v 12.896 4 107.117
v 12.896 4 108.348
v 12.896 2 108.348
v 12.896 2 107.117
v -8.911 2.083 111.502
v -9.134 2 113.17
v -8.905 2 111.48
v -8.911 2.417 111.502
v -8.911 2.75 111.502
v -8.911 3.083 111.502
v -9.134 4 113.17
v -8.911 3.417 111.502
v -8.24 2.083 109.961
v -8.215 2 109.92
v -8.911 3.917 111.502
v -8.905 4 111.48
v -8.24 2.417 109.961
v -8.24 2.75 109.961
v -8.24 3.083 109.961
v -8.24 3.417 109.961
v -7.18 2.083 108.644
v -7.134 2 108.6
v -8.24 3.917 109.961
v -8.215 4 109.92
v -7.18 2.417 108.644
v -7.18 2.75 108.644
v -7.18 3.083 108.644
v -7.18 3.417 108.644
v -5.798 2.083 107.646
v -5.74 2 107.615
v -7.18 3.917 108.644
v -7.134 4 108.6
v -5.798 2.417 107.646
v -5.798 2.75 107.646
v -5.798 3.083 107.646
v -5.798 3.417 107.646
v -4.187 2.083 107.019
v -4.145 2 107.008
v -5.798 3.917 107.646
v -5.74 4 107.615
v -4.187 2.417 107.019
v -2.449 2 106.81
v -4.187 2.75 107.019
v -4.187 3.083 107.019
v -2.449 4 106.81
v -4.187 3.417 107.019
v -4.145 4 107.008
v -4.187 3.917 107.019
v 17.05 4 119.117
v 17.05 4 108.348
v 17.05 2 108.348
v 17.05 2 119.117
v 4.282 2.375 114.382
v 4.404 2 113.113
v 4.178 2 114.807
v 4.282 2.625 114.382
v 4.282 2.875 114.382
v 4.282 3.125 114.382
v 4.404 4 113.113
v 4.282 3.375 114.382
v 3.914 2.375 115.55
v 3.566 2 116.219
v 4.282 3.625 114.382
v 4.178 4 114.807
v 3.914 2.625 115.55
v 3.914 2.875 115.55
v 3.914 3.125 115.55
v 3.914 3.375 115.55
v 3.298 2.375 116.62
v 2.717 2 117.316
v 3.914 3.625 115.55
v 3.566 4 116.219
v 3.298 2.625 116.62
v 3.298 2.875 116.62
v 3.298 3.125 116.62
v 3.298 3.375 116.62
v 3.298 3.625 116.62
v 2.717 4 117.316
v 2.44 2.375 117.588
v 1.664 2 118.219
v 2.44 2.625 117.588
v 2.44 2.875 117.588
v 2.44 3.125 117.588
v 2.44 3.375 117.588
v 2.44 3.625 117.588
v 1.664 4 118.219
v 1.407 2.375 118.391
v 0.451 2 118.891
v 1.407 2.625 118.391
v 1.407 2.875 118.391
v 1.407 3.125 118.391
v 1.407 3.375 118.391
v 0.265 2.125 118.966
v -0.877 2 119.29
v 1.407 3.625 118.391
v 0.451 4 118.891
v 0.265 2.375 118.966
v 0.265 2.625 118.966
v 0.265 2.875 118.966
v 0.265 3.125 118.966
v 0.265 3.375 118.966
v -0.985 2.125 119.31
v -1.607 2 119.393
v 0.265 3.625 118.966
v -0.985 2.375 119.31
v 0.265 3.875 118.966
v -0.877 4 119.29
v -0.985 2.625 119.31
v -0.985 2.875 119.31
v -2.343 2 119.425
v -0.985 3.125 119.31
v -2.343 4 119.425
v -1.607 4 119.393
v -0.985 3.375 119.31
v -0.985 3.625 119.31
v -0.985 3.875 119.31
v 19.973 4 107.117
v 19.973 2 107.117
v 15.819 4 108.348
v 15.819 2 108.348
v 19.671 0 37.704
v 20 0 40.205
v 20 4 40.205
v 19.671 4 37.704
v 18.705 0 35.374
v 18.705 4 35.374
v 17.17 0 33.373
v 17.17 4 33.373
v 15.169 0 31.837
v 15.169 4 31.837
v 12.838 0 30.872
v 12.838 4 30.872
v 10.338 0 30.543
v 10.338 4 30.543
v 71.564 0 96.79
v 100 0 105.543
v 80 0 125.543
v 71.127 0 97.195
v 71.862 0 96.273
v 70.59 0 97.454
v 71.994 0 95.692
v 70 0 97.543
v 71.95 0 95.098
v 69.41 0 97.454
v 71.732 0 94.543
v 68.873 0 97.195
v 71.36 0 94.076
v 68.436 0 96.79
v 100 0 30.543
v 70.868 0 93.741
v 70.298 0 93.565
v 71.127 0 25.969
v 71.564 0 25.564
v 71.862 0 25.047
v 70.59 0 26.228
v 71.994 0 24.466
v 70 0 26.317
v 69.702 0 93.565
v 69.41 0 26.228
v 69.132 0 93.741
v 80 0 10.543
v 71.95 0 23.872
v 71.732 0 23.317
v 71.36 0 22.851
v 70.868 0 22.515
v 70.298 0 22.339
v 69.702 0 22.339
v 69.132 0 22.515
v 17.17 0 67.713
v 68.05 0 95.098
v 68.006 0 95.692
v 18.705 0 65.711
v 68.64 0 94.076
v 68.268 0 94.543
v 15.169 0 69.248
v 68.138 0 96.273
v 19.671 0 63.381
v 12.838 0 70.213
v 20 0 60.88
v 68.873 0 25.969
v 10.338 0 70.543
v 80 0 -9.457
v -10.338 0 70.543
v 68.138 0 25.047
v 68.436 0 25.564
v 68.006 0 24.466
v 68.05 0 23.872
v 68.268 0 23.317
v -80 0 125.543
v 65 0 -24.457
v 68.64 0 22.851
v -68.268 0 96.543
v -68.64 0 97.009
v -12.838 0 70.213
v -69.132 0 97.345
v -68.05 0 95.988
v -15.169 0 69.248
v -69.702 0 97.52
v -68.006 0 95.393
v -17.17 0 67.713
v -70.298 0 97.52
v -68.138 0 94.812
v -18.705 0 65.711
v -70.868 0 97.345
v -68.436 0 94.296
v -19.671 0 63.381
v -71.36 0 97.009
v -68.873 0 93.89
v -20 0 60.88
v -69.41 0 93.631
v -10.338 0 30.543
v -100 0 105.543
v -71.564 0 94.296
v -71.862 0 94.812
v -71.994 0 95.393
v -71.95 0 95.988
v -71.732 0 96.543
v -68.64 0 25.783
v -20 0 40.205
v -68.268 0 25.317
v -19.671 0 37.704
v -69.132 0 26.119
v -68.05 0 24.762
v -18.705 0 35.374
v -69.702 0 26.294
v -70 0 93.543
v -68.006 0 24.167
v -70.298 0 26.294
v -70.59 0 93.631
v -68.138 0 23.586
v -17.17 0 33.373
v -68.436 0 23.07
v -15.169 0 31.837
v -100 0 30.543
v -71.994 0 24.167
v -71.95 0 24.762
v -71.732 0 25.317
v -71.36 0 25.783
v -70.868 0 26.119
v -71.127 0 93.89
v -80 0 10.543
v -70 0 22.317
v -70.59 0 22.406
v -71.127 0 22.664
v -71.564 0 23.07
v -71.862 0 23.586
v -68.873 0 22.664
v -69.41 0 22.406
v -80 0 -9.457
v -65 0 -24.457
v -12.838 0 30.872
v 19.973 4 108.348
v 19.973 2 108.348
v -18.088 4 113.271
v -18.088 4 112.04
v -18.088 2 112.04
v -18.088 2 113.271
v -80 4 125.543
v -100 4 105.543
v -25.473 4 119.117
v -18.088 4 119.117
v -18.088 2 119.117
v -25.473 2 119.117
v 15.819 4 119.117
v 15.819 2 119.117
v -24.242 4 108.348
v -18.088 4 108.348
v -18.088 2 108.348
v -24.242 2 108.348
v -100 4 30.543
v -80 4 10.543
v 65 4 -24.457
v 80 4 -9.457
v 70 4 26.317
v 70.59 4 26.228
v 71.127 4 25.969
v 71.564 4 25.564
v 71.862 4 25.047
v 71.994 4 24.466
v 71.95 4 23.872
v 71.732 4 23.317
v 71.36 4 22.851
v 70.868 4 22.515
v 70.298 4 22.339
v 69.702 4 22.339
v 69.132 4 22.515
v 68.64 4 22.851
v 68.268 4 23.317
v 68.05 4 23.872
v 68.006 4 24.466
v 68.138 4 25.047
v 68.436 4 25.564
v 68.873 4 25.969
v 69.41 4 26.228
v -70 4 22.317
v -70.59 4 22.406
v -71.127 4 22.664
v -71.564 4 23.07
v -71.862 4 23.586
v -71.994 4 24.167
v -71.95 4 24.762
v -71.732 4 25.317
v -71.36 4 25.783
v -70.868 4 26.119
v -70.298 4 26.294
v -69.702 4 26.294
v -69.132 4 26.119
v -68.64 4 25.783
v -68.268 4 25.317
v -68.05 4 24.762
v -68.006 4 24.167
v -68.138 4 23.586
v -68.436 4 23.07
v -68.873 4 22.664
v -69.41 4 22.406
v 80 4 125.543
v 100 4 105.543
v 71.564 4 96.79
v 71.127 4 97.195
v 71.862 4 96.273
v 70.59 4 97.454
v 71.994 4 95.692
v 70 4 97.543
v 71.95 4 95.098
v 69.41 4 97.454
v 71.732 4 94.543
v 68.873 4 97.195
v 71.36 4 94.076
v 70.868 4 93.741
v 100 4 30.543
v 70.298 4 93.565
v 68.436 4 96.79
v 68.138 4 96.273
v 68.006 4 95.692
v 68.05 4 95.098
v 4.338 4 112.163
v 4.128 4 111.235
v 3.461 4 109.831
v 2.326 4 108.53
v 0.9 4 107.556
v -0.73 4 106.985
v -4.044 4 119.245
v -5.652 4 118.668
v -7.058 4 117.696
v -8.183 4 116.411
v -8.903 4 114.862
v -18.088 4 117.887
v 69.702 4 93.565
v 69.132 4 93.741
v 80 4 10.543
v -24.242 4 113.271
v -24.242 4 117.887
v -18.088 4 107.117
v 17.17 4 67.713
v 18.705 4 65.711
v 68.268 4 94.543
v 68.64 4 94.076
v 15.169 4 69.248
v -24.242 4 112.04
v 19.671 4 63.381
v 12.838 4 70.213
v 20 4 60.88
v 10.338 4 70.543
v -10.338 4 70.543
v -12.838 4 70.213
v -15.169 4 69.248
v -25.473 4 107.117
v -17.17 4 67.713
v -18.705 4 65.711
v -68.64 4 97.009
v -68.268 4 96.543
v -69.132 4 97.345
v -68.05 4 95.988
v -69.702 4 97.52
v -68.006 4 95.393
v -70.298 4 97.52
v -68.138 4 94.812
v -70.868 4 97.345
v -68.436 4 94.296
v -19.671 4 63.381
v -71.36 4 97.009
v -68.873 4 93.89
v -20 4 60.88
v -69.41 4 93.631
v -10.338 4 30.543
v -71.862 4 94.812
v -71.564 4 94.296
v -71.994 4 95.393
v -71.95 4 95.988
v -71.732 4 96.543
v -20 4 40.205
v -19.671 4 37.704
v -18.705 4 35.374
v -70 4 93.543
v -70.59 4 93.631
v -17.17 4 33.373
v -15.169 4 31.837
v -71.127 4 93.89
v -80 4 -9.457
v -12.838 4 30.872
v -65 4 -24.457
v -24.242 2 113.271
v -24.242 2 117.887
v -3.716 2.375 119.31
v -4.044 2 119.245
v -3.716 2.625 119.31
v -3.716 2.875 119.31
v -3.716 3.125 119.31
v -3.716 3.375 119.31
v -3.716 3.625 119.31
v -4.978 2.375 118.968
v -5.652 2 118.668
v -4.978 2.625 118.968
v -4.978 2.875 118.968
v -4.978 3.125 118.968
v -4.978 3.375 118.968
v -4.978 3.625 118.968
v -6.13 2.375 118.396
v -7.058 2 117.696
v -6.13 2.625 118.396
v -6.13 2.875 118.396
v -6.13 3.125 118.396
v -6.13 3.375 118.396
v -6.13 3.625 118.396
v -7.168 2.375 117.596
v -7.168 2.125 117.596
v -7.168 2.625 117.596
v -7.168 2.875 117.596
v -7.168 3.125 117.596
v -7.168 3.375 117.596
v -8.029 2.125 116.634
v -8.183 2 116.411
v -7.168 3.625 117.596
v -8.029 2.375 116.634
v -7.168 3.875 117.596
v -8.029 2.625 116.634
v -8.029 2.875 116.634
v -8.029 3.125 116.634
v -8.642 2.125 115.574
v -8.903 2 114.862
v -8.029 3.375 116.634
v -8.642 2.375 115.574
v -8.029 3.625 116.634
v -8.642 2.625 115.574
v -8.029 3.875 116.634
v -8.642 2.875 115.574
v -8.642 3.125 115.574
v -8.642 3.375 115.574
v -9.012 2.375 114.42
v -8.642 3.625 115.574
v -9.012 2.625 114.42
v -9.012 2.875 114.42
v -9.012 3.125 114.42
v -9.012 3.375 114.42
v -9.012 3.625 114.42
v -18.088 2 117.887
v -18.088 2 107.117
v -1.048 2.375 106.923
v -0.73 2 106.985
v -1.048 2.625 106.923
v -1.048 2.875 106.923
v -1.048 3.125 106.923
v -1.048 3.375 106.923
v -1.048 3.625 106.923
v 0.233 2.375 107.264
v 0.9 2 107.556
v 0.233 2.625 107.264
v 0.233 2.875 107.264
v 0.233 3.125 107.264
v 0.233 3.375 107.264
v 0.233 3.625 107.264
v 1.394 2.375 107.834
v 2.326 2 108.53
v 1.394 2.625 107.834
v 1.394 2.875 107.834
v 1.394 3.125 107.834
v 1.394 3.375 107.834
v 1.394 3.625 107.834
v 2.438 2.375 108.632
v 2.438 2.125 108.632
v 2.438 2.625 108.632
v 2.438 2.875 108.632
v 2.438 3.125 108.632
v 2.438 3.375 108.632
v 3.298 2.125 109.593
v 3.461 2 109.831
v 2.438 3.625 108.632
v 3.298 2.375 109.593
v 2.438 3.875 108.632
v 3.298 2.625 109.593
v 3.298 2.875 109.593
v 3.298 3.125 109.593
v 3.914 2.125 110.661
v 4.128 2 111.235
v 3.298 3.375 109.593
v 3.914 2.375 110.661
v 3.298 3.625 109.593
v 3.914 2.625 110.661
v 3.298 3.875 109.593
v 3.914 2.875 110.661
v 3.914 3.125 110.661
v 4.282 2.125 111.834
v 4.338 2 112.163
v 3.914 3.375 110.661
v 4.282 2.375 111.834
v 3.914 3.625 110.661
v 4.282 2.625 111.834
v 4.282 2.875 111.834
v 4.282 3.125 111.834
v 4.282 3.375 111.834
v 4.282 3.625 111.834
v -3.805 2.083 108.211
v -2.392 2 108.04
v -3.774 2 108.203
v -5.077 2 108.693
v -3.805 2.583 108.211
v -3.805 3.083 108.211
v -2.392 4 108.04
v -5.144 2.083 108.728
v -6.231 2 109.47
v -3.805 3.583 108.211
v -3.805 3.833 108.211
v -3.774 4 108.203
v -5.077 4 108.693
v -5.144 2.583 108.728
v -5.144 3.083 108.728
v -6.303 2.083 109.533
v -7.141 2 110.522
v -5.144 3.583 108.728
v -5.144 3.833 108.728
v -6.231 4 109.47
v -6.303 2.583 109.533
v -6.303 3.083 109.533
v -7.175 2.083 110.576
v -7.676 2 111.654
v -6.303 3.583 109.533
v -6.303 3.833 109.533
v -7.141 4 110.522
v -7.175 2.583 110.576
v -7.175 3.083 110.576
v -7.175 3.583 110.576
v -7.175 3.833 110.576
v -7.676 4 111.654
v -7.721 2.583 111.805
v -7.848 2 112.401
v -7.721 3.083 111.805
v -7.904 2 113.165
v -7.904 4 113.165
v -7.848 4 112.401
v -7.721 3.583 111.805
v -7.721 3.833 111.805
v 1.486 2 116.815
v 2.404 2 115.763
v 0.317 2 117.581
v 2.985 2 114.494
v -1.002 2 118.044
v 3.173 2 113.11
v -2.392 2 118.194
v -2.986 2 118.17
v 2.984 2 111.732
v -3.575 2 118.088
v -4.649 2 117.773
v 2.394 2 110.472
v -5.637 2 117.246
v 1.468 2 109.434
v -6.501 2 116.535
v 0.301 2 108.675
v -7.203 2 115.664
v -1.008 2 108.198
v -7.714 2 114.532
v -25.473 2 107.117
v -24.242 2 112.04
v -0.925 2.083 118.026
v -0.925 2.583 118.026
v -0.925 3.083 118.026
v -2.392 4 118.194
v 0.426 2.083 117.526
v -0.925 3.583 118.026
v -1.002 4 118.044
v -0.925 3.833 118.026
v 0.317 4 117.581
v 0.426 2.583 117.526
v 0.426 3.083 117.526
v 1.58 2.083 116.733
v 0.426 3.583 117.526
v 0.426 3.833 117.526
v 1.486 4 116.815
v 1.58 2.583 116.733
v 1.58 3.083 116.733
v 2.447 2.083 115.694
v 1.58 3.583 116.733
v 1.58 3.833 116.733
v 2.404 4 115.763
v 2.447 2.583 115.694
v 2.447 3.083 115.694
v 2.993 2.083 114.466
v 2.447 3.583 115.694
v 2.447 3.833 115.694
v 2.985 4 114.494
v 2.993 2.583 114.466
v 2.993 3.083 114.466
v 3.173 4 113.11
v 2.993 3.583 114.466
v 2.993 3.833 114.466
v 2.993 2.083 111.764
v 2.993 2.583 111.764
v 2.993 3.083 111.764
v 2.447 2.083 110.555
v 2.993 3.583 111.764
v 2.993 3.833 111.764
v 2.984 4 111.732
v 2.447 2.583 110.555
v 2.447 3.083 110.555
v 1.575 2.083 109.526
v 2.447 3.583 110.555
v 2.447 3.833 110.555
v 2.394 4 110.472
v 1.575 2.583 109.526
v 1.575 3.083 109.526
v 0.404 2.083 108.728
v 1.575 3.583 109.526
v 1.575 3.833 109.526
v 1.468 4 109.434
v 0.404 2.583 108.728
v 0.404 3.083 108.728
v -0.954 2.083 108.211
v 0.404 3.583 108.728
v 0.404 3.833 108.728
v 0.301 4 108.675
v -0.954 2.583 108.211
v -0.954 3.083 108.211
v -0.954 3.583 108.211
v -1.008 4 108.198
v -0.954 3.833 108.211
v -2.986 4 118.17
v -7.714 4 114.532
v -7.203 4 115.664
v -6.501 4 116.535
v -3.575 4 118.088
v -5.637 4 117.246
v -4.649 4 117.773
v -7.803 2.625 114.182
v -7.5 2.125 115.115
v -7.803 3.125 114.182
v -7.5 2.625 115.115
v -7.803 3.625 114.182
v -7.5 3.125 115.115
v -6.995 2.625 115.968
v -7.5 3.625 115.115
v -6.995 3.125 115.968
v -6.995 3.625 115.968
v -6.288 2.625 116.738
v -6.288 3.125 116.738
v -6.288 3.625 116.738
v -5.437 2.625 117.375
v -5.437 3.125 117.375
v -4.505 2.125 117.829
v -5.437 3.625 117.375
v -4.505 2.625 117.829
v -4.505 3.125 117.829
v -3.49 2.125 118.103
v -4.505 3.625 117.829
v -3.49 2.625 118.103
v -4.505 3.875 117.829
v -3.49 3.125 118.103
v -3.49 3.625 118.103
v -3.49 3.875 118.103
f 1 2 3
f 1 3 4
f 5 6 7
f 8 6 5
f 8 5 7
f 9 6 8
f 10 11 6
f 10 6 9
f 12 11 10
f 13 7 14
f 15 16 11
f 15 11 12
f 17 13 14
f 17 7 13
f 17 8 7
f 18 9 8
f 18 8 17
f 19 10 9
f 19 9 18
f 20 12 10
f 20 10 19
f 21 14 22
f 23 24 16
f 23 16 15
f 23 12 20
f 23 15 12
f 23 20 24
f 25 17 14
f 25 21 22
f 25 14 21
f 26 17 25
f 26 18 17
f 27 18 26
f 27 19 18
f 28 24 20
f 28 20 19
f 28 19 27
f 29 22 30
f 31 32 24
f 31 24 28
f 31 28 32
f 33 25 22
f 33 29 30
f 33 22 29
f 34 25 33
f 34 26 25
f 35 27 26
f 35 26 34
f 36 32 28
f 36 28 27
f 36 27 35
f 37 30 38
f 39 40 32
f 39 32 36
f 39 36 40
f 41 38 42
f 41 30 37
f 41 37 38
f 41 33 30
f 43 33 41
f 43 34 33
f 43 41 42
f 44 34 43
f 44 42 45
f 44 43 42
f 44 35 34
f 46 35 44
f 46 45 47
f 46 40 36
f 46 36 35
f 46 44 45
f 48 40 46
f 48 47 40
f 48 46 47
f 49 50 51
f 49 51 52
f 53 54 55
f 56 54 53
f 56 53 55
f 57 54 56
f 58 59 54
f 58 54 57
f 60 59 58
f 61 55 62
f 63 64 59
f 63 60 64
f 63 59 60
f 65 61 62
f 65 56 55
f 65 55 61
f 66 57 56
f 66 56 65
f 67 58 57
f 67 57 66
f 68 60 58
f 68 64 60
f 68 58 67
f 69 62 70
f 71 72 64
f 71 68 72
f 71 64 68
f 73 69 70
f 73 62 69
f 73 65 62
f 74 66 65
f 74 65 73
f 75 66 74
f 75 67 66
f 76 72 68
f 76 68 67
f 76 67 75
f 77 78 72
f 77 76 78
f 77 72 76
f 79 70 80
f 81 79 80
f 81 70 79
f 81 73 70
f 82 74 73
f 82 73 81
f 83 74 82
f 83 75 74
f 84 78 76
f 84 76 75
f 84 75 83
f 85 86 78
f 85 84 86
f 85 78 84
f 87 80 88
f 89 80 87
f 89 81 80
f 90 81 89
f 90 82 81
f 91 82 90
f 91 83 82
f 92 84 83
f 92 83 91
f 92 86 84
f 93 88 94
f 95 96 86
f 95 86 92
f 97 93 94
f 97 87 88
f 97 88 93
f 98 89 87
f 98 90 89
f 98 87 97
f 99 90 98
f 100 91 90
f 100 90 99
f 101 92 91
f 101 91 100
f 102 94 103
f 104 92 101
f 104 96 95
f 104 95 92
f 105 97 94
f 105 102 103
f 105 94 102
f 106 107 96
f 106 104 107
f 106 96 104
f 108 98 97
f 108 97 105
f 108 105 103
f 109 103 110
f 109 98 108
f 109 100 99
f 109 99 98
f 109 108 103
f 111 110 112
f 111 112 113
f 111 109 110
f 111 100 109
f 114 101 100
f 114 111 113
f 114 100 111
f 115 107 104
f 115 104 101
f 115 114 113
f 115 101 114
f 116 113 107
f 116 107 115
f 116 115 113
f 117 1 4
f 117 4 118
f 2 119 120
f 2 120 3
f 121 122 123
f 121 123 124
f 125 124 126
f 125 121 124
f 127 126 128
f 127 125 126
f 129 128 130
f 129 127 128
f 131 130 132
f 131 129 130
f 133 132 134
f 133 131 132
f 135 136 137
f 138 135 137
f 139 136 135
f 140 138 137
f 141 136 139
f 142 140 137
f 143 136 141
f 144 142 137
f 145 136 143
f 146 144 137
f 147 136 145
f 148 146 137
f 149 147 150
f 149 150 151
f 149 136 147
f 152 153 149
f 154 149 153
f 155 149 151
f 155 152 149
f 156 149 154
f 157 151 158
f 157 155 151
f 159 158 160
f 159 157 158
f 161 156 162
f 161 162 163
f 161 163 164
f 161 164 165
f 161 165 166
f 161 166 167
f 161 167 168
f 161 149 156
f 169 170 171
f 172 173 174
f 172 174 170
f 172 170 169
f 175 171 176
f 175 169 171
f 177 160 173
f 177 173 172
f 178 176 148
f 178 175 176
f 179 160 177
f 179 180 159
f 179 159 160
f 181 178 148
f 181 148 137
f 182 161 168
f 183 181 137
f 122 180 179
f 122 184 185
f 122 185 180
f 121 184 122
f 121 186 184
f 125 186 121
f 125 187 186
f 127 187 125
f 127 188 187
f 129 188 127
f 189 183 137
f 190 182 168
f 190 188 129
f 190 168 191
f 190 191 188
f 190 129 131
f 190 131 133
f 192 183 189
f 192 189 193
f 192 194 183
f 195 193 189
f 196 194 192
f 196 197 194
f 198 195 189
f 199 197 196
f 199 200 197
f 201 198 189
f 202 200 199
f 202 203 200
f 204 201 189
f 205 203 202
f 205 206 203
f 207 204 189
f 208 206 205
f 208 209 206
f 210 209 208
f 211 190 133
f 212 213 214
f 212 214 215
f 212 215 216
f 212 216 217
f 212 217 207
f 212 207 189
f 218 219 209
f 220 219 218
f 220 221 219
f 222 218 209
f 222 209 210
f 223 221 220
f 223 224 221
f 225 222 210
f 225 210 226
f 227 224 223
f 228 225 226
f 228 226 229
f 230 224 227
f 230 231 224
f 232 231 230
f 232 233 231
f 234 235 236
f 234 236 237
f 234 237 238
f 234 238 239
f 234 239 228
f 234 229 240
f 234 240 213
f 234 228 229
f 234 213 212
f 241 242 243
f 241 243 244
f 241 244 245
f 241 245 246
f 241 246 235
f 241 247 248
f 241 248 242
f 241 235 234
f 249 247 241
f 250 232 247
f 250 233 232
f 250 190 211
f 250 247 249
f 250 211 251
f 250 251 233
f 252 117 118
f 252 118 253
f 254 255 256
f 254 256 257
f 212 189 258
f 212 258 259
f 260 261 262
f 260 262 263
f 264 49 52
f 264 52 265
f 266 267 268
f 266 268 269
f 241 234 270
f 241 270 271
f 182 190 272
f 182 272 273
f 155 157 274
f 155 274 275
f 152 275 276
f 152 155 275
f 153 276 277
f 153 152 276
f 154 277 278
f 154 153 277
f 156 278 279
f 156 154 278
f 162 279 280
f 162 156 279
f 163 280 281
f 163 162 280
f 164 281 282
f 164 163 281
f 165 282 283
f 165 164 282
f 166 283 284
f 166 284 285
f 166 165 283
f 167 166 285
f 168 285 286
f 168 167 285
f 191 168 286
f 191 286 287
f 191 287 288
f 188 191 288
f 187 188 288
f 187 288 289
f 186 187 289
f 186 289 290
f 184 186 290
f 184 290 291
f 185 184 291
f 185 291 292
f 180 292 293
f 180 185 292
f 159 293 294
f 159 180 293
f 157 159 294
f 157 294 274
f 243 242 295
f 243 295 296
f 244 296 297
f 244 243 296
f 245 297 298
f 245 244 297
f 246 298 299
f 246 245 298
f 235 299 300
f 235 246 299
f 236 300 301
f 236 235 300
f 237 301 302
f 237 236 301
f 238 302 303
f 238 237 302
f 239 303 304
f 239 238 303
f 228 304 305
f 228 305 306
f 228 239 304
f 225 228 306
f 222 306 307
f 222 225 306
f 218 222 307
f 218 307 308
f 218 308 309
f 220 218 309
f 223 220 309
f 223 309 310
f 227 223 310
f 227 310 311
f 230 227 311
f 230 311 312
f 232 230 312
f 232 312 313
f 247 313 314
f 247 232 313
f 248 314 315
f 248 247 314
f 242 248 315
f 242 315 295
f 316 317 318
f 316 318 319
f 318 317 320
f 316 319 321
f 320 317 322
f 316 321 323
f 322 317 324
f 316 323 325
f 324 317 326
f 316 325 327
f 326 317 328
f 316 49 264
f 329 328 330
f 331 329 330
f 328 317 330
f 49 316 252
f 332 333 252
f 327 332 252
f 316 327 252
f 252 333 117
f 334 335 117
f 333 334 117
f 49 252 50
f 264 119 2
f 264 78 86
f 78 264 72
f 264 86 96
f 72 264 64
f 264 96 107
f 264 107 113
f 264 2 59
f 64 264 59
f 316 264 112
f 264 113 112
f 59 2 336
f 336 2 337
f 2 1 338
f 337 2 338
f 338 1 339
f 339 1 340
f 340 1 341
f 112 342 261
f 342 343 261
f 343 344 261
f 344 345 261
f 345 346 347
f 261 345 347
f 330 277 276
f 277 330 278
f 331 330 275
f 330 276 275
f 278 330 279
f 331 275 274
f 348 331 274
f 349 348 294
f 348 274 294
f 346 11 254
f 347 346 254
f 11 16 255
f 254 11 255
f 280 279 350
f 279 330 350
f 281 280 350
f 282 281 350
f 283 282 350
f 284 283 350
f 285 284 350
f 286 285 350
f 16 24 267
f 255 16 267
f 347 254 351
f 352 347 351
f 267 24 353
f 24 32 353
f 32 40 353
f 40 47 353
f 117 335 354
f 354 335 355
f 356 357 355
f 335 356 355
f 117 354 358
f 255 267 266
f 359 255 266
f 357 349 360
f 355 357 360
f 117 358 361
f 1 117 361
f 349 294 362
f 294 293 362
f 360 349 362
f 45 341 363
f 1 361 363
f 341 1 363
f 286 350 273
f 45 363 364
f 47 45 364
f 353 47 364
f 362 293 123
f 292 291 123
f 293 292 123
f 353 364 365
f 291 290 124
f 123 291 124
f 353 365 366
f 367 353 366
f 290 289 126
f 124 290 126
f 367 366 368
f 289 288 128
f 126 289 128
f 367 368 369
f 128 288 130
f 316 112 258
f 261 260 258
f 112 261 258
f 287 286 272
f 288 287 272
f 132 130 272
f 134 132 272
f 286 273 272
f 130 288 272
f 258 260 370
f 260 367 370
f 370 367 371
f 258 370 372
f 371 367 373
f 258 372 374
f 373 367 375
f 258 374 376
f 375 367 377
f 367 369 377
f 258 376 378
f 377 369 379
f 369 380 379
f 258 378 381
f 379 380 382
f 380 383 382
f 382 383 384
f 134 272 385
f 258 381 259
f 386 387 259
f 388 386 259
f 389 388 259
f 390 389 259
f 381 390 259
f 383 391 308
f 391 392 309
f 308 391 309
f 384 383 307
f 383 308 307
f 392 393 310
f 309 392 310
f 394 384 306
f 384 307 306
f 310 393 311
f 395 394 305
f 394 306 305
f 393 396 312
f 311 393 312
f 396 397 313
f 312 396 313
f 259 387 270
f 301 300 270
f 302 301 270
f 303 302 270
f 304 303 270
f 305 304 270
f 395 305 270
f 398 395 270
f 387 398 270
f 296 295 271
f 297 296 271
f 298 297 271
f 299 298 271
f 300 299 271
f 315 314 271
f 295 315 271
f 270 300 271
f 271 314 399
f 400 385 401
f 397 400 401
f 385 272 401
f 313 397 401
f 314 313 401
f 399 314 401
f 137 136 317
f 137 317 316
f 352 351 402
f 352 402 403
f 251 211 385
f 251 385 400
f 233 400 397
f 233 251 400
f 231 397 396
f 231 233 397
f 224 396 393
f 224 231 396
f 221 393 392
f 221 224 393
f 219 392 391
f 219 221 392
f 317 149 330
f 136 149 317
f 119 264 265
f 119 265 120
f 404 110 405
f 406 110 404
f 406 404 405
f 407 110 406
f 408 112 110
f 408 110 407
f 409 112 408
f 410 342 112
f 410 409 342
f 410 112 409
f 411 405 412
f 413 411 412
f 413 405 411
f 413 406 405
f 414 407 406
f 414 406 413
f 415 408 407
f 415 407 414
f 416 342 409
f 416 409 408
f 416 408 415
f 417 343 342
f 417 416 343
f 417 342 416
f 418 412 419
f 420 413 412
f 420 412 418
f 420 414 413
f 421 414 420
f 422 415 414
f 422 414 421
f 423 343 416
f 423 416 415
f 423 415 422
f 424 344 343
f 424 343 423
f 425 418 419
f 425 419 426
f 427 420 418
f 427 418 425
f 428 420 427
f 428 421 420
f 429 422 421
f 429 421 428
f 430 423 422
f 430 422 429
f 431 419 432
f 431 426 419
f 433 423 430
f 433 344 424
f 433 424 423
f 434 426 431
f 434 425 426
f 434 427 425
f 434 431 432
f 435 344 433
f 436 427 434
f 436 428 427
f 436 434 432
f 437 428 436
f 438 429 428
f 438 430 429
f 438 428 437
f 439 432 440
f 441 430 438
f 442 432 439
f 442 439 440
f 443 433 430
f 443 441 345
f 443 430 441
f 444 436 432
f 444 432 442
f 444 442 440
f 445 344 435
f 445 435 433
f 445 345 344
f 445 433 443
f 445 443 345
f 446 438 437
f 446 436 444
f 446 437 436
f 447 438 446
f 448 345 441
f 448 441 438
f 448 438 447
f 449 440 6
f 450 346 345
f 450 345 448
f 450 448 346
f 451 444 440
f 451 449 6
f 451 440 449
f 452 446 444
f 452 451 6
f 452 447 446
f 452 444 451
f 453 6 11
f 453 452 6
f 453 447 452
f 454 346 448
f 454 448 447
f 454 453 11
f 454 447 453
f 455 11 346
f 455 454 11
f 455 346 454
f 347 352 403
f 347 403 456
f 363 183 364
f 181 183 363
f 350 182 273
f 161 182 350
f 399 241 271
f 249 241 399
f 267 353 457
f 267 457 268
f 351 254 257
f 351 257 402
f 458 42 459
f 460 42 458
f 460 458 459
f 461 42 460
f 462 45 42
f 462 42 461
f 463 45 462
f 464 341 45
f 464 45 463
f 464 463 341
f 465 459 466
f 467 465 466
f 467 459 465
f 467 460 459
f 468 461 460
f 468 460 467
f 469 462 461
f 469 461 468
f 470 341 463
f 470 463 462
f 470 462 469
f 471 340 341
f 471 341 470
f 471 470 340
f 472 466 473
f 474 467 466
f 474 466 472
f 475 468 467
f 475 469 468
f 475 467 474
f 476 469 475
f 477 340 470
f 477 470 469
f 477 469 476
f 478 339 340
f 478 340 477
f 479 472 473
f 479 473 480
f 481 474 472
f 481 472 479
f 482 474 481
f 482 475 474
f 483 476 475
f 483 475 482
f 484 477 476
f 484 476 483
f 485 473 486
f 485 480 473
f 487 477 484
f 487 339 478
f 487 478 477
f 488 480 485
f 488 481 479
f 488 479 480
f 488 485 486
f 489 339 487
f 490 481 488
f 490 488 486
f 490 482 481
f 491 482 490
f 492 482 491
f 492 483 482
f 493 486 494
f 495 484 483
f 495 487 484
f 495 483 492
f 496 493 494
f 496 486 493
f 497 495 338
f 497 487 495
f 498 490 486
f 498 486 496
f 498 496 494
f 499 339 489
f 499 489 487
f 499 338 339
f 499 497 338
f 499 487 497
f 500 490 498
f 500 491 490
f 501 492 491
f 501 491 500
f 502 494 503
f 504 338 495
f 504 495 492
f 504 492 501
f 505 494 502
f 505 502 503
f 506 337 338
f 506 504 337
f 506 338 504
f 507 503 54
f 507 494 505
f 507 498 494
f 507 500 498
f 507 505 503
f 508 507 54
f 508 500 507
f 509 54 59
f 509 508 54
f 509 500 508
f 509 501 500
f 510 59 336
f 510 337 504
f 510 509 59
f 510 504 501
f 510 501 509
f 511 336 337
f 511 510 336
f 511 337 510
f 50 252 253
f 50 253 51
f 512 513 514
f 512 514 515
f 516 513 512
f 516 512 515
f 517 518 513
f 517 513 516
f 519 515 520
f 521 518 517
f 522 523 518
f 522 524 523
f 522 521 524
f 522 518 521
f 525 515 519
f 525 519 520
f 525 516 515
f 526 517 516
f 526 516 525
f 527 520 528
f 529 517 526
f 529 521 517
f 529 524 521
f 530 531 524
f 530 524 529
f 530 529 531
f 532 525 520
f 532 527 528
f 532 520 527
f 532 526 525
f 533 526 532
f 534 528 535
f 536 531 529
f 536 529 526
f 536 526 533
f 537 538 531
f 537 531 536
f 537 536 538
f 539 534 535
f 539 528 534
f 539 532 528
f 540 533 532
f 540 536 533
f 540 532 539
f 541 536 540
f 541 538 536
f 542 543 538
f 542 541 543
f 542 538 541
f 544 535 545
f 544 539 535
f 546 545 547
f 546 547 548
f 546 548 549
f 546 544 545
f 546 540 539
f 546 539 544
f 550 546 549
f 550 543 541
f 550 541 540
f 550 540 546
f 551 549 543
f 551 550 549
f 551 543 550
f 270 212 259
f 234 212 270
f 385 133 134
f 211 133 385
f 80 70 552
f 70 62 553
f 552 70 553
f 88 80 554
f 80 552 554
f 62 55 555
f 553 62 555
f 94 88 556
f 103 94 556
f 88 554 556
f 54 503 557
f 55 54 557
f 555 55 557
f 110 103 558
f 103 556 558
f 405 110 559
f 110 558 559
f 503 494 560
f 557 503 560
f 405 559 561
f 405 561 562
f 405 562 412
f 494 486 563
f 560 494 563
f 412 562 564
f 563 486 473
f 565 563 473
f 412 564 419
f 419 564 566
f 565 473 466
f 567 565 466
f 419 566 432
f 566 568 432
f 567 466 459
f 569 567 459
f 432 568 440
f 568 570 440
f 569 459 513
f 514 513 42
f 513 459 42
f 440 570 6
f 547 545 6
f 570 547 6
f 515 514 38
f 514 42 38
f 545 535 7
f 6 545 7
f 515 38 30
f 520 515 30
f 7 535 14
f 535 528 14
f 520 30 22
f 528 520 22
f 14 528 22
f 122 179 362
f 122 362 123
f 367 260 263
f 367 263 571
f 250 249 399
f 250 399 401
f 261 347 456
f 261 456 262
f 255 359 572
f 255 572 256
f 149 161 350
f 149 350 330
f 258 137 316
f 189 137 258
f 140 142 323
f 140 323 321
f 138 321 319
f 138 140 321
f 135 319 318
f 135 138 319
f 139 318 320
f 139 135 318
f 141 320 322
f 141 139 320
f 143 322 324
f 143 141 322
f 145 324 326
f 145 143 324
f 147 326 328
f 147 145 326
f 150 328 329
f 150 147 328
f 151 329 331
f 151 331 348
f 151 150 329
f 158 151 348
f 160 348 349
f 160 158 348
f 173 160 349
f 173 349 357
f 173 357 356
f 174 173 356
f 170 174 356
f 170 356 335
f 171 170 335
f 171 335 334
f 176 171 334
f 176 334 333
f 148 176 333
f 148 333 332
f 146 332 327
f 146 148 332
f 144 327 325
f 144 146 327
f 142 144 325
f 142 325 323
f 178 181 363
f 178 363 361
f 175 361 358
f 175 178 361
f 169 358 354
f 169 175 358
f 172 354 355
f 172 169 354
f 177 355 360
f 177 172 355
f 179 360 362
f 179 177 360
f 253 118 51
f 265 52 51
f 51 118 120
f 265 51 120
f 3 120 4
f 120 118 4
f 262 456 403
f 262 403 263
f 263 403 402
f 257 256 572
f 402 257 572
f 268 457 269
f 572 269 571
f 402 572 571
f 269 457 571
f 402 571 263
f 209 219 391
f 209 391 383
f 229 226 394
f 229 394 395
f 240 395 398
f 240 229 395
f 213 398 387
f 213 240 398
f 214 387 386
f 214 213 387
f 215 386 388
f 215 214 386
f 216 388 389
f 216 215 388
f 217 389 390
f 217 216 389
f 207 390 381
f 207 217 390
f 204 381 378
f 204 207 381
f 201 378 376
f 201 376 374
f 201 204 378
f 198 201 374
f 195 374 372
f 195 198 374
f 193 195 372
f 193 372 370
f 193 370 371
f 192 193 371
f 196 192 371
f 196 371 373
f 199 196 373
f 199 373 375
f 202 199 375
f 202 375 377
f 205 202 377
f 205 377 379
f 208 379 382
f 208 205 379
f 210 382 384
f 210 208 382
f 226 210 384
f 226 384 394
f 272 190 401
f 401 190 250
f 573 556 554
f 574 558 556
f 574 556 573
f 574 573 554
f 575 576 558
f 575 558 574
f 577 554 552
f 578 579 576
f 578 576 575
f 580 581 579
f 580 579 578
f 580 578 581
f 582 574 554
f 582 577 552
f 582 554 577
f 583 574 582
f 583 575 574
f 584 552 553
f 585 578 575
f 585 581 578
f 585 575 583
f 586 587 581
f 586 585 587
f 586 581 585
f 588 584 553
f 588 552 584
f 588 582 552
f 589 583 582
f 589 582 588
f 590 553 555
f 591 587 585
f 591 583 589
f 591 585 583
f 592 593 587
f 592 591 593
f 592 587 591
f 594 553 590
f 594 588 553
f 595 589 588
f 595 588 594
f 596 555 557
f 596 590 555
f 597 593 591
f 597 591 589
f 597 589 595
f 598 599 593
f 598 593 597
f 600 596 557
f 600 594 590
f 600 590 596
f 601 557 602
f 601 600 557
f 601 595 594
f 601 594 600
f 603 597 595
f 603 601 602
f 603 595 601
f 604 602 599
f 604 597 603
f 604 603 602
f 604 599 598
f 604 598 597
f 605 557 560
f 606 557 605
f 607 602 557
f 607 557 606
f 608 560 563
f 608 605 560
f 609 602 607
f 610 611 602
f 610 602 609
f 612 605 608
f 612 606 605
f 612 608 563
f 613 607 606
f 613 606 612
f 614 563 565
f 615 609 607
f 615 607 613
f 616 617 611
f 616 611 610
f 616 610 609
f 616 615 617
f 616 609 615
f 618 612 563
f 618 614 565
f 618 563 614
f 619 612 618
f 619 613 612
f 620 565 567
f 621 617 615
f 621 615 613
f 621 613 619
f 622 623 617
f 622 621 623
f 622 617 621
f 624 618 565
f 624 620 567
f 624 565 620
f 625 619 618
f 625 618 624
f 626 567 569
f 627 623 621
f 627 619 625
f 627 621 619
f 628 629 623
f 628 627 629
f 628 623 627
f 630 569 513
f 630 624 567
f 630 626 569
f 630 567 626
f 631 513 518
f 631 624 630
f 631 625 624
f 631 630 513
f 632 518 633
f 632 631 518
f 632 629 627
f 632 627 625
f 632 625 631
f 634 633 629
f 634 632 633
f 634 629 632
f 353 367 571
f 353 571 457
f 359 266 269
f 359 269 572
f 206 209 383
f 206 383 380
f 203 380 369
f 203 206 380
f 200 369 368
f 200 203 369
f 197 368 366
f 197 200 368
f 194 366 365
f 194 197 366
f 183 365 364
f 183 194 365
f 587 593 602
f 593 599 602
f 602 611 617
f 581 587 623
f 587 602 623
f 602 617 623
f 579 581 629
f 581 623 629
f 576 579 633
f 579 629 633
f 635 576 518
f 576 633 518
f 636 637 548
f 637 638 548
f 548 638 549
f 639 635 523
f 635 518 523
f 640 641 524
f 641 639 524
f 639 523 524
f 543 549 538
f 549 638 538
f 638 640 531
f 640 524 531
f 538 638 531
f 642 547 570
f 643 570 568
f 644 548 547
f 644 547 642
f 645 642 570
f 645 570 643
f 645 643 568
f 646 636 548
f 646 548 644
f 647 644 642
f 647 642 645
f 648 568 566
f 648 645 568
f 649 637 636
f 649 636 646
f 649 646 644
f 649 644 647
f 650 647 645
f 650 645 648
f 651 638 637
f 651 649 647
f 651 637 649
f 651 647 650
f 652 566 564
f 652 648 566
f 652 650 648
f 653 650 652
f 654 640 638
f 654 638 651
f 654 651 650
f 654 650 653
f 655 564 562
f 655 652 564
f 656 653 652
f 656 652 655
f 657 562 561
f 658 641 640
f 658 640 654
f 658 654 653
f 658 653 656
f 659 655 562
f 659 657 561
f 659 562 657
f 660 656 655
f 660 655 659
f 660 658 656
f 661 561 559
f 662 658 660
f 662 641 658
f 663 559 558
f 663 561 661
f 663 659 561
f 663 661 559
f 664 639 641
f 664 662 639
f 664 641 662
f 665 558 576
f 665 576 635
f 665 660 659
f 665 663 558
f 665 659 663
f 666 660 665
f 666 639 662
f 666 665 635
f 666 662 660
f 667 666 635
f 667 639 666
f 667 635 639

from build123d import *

# Parameters (mm, degrees)
SKETCH1_R           = 2
BOSS_EXTRUDE1_DEPTH = 4
CUT_EXTRUDE1_DEPTH  = 2


with BuildPart() as part:
    # Sketch1 → Boss-Extrude1 (new body)
    with BuildSketch(Plane(origin=(0, 0, 0), x_dir=(1, 0, 0), z_dir=(0, 1, 0))):
        Polygon((-80, 9.45742592), (-65, 24.45742592), (-25, 24.45742592), (25, 24.45742592), (65, 24.45742592), (80, 9.45742592), (80, -10.54257408), (100, -30.54257408), (100, -105.54257408), (80, -125.54257408), (-80, -125.54257408), (-100, -105.54257408), (-100, -30.54257408), (-80, -10.54257408), align=None)
        with Locations(Location((70, -24.316787178, 0), (0, 0, 270))):
            Circle(SKETCH1_R, mode=Mode.SUBTRACT)
        with Locations(Location((-70, -24.316787178, 0), (0, 0, 90))):
            Circle(SKETCH1_R, mode=Mode.SUBTRACT)
        with Locations(Location((70, -95.54257408, 0), (0, 0, 270))):
            Circle(SKETCH1_R, mode=Mode.SUBTRACT)
        with Locations(Location((-70, -95.54257408, 0), (0, 0, 90))):
            Circle(SKETCH1_R, mode=Mode.SUBTRACT)
        with BuildLine():
            Line((10.337598094, -30.54257408), (-10.337598094, -30.54257408))
            ThreePointArc((-10.337598094, -30.54257408), (-17.169948004, -33.372626076), (-20, -40.204975986))
            Line((-20, -40.204975986), (-20, -60.880172175))
            ThreePointArc((-20, -60.880172175), (-17.169948004, -67.712522085), (-10.337598094, -70.54257408))
            Line((-10.337598094, -70.54257408), (10.337598094, -70.54257408))
            ThreePointArc((10.337598094, -70.54257408), (17.169948004, -67.712522085), (20, -60.880172175))
            Line((20, -60.880172175), (20, -40.204975986))
            ThreePointArc((20, -40.204975986), (17.169948004, -33.372626076), (10.337598094, -30.54257408))
        make_face(mode=Mode.SUBTRACT)
    extrude(amount=BOSS_EXTRUDE1_DEPTH)

    # Sketch2 → Cut-Extrude1 (cut)
    # profile 1 of 3: a face of its own
    with BuildSketch(Plane(origin=(0, 4, 0), x_dir=(1, 0, 0), z_dir=(0, 1, 0))):
        Polygon((-25.472812288, -107.11733973), (-18.088196904, -107.11733973), (-18.088196904, -108.348108961), (-24.242043057, -108.348108961), (-24.242043057, -112.040416653), (-18.088196904, -112.040416653), (-18.088196904, -113.271185884), (-24.242043057, -113.271185884), (-24.242043057, -117.886570499), (-18.088196904, -117.886570499), (-18.088196904, -119.11733973), (-25.472812288, -119.11733973), align=None)
    # profile 2 of 3: a face of its own
    with BuildSketch(Plane(origin=(0, 4, 0), x_dir=(1, 0, 0), z_dir=(0, 1, 0))):
        with BuildLine():
            add(Edge.make_bspline(
                [(-2.449254596, -106.809647422), (-2.210250294, -106.815291388), (-1.741137338, -106.826369254), (-1.052600103, -106.910458186), (-0.39562656, -107.057401058), (0.234998612, -107.251617707), (0.833013231, -107.511533008), (1.401913508, -107.825392722), (1.940223039, -108.19794914), (2.443138546, -108.623167189), (2.901482907, -109.087804066), (3.30556983, -109.582626329), (3.641608313, -110.107938076), (3.925601094, -110.655428552), (4.137939972, -111.233761906), (4.293457565, -111.836588501), (4.386018721, -112.46623686), (4.398023561, -112.895080616), (4.404110789, -113.112532038)],
                knots=[0, 0, 0, 0, 1.104339174, 2.167575275, 3.19895946, 4.211974237, 5.212103104, 6.206540156, 7.210035823, 8.232212855, 9.245525355, 10.222267028, 11.178495095, 12.122427609, 13.066774007, 14.018748382, 14.995377748, 16, 16, 16, 16], degree=3))
            add(Edge.make_bspline(
                [(4.404110789, -113.112532038), (4.398050369, -113.328392066), (4.386099229, -113.754067761), (4.293053577, -114.379582401), (4.138376677, -114.979542971), (3.923642546, -115.555449046), (3.645900791, -116.106283535), (3.303525105, -116.630032235), (2.902767408, -117.129340391), (2.445660949, -117.597050461), (1.945808283, -118.023324325), (1.413543804, -118.399049089), (0.854948848, -118.718415341), (0.266006362, -118.975934066), (-0.347638297, -119.179500527), (-0.989897569, -119.319540684), (-1.657446562, -119.409328528), (-2.112422229, -119.419742975), (-2.343485365, -119.425032038)],
                knots=[0, 0, 0, 0, 1.006897034, 1.98559964, 2.943186421, 3.893189035, 4.847917768, 5.815452073, 6.80748931, 7.830684368, 8.862341799, 9.868509738, 10.866468422, 11.859160648, 12.862936224, 13.87796334, 14.922306222, 16, 16, 16, 16], degree=3))
            add(Edge.make_bspline(
                [(-2.343485365, -119.425032038), (-2.576950096, -119.419751502), (-3.036711209, -119.409352567), (-3.71220671, -119.319311427), (-4.360699664, -119.179942779), (-4.980525124, -118.978602698), (-5.5723218, -118.720276019), (-6.137109172, -118.40432461), (-6.672334655, -118.029426015), (-7.173565891, -117.603625551), (-7.631923667, -117.139805588), (-8.034841868, -116.645043071), (-8.372094355, -116.1233088), (-8.651102104, -115.57930445), (-8.869213941, -115.011416487), (-9.022819268, -114.418815701), (-9.116441893, -113.80221707), (-9.128324324, -113.382893249), (-9.13435075, -113.170224345)],
                knots=[0, 0, 0, 0, 1.090007837, 2.146547848, 3.177224824, 4.18441606, 5.184972819, 6.188625542, 7.201944888, 8.232227685, 9.256408654, 10.243626549, 11.2069681, 12.152656664, 13.094449289, 14.042142631, 15.007031417, 16, 16, 16, 16], degree=3))
            add(Edge.make_bspline(
                [(-9.13435075, -113.170224345), (-9.131402402, -113.027503498), (-9.125543406, -112.743886726), (-9.083913012, -112.322131275), (-9.014460276, -111.907586661), (-8.915300454, -111.501446595), (-8.79027069, -111.102737582), (-8.635770803, -110.712430579), (-8.452859537, -110.330424135), (-8.243335129, -109.958340787), (-8.012332045, -109.598947931), (-7.756068538, -109.258983468), (-7.479948492, -108.939194203), (-7.182889634, -108.640362727), (-6.867359525, -108.360919774), (-6.532033375, -108.100372257), (-6.176100518, -107.859172902), (-5.798893902, -107.642516339), (-5.409943928, -107.444915382), (-5.008890938, -107.277563759), (-4.602546124, -107.132145303), (-4.1874152, -107.014075594), (-3.764227753, -106.922537912), (-3.332923423, -106.859004422), (-2.894073915, -106.815043973), (-2.598402752, -106.811456889), (-2.449254596, -106.809647422)],
                knots=[0, 0, 0, 0, 1.000860702, 1.988923732, 2.969140983, 3.946405888, 4.918600368, 5.897447419, 6.887793071, 7.886663957, 8.890501988, 9.881803818, 10.869866848, 11.851371953, 12.834677219, 13.823874237, 14.827633617, 15.847405218, 16.872782081, 17.885187697, 18.892981817, 19.898014594, 20.909858577, 21.927149733, 22.954372848, 24, 24, 24, 24], degree=3))
        make_face()
        with BuildLine():
            add(Edge.make_bspline(
                [(-2.391562288, -108.040416653), (-2.51184609, -108.0418057), (-2.751297347, -108.044570903), (-3.107479041, -108.08096615), (-3.459211644, -108.132822075), (-3.806556963, -108.206786881), (-4.14828776, -108.307535093), (-4.487080949, -108.423686022), (-4.820001205, -108.564158934), (-5.145048651, -108.725339097), (-5.461327271, -108.900684803), (-5.759556253, -109.095930039), (-6.039502965, -109.306760329), (-6.304261521, -109.529097242), (-6.549973838, -109.767761164), (-6.777377431, -110.021526333), (-6.986073395, -110.291257805), (-7.178028363, -110.573366758), (-7.348947973, -110.867432361), (-7.498868436, -111.170494536), (-7.62377932, -111.483313645), (-7.724554049, -111.80421787), (-7.804316815, -112.132626352), (-7.862174528, -112.469031549), (-7.896221771, -112.814553211), (-7.901109212, -113.047553648), (-7.903581519, -113.165416653)],
                knots=[0, 0, 0, 0, 1.034314358, 2.059029303, 3.076765405, 4.092094375, 5.110880351, 6.139806059, 7.171636845, 8.216667878, 9.259764826, 10.280693852, 11.280175756, 12.273075775, 13.252873351, 14.224294354, 15.201858716, 16.184537379, 17.157522275, 18.125488912, 19.09060439, 20.051995777, 21.016643451, 21.995737629, 22.98614617, 24, 24, 24, 24], degree=3))
            add(Edge.make_bspline(
                [(-7.903581519, -113.165416653), (-7.898210266, -113.338737702), (-7.887640897, -113.679793001), (-7.812726489, -114.180904838), (-7.683291296, -114.659574953), (-7.508287161, -115.120354866), (-7.277404332, -115.558281175), (-7.000063223, -115.978132576), (-6.666845655, -116.372061943), (-6.292646829, -116.745390197), (-5.880146385, -117.082729501), (-5.44364821, -117.380106417), (-4.986383542, -117.633010709), (-4.506209078, -117.835958031), (-4.007433542, -117.999585026), (-3.486730857, -118.110234502), (-2.946554931, -118.18376774), (-2.578511943, -118.190727536), (-2.391562288, -118.194262807)],
                knots=[0, 0, 0, 0, 1.001985766, 1.97167371, 2.92126608, 3.864235468, 4.815363556, 5.777764185, 6.767768529, 7.793129838, 8.830022713, 9.843858898, 10.843270901, 11.845781331, 12.853757634, 13.873335827, 14.919748107, 16, 16, 16, 16], degree=3))
            add(Edge.make_bspline(
                [(-2.391562288, -118.194262807), (-2.265694924, -118.192621379), (-2.015966383, -118.189364685), (-1.645104851, -118.157003325), (-1.281395782, -118.104598333), (-0.925240361, -118.029433653), (-0.576244711, -117.935364332), (-0.233153423, -117.823551486), (0.100372074, -117.684715343), (0.427101168, -117.529966058), (0.740175644, -117.354340251), (1.039601812, -117.16560959), (1.318510615, -116.957318496), (1.581165171, -116.736781999), (1.825472925, -116.499862953), (2.050952736, -116.246848151), (2.261725563, -115.980033401), (2.450260234, -115.696029586), (2.621177719, -115.402100516), (2.767700537, -115.097816084), (2.893598008, -114.786452751), (2.997130868, -114.466920991), (3.076803707, -114.139077256), (3.1313758, -113.803085971), (3.16606526, -113.45941233), (3.170902759, -113.22719785), (3.173341558, -113.110128191)],
                knots=[0, 0, 0, 0, 1.078057494, 2.138931934, 3.186396846, 4.224372019, 5.255081129, 6.281828204, 7.313085757, 8.34778727, 9.37721554, 10.386466275, 11.377698063, 12.356805186, 13.322831121, 14.290221845, 15.258318578, 16.233084811, 17.207971885, 18.168911637, 19.123652981, 20.083145109, 21.043790605, 22.010913397, 22.997212883, 24, 24, 24, 24], degree=3))
            add(Edge.make_bspline(
                [(3.173341558, -113.110128191), (3.17090158, -112.993859656), (3.166061946, -112.763244051), (3.131393694, -112.421962658), (3.076744617, -112.088390211), (2.99751732, -111.763602521), (2.893538851, -111.448182118), (2.767688648, -111.141603013), (2.62108354, -110.842157029), (2.450347273, -110.552897813), (2.260835592, -110.2736522), (2.051169953, -110.008485876), (1.822036233, -109.758928429), (1.576327544, -109.520966037), (1.3089803, -109.302162037), (1.02661365, -109.09253243), (0.723417639, -108.901791872), (0.404825644, -108.724478005), (0.075233739, -108.564179625), (-0.261824464, -108.424238717), (-0.604923371, -108.306558799), (-0.951912321, -108.207281647), (-1.305443018, -108.132458501), (-1.662879889, -108.081207676), (-2.025417117, -108.044452246), (-2.268872505, -108.04176892), (-2.391562288, -108.040416653)],
                knots=[0, 0, 0, 0, 0.999618921, 1.982718035, 2.946629433, 3.904142108, 4.854089328, 5.799603779, 6.751722253, 7.718313886, 8.685273778, 9.65154614, 10.6220342, 11.596597958, 12.589904812, 13.590354425, 14.618671442, 15.667306976, 16.72423902, 17.768315198, 18.803281207, 19.841475733, 20.86981583, 21.90753015, 22.945496034, 24, 24, 24, 24], degree=3))
        make_face(mode=Mode.SUBTRACT)
    # profile 3 of 3: a face of its own
    with BuildSketch(Plane(origin=(0, 4, 0), x_dir=(1, 0, 0), z_dir=(0, 1, 0))):
        Polygon((12.896418481, -108.348108961), (12.896418481, -107.11733973), (19.973341558, -107.11733973), (19.973341558, -108.348108961), (17.050264635, -108.348108961), (17.050264635, -119.11733973), (15.819495404, -119.11733973), (15.819495404, -108.348108961), align=None)
    extrude(amount=-CUT_EXTRUDE1_DEPTH, mode=Mode.SUBTRACT)


solid = part.part
